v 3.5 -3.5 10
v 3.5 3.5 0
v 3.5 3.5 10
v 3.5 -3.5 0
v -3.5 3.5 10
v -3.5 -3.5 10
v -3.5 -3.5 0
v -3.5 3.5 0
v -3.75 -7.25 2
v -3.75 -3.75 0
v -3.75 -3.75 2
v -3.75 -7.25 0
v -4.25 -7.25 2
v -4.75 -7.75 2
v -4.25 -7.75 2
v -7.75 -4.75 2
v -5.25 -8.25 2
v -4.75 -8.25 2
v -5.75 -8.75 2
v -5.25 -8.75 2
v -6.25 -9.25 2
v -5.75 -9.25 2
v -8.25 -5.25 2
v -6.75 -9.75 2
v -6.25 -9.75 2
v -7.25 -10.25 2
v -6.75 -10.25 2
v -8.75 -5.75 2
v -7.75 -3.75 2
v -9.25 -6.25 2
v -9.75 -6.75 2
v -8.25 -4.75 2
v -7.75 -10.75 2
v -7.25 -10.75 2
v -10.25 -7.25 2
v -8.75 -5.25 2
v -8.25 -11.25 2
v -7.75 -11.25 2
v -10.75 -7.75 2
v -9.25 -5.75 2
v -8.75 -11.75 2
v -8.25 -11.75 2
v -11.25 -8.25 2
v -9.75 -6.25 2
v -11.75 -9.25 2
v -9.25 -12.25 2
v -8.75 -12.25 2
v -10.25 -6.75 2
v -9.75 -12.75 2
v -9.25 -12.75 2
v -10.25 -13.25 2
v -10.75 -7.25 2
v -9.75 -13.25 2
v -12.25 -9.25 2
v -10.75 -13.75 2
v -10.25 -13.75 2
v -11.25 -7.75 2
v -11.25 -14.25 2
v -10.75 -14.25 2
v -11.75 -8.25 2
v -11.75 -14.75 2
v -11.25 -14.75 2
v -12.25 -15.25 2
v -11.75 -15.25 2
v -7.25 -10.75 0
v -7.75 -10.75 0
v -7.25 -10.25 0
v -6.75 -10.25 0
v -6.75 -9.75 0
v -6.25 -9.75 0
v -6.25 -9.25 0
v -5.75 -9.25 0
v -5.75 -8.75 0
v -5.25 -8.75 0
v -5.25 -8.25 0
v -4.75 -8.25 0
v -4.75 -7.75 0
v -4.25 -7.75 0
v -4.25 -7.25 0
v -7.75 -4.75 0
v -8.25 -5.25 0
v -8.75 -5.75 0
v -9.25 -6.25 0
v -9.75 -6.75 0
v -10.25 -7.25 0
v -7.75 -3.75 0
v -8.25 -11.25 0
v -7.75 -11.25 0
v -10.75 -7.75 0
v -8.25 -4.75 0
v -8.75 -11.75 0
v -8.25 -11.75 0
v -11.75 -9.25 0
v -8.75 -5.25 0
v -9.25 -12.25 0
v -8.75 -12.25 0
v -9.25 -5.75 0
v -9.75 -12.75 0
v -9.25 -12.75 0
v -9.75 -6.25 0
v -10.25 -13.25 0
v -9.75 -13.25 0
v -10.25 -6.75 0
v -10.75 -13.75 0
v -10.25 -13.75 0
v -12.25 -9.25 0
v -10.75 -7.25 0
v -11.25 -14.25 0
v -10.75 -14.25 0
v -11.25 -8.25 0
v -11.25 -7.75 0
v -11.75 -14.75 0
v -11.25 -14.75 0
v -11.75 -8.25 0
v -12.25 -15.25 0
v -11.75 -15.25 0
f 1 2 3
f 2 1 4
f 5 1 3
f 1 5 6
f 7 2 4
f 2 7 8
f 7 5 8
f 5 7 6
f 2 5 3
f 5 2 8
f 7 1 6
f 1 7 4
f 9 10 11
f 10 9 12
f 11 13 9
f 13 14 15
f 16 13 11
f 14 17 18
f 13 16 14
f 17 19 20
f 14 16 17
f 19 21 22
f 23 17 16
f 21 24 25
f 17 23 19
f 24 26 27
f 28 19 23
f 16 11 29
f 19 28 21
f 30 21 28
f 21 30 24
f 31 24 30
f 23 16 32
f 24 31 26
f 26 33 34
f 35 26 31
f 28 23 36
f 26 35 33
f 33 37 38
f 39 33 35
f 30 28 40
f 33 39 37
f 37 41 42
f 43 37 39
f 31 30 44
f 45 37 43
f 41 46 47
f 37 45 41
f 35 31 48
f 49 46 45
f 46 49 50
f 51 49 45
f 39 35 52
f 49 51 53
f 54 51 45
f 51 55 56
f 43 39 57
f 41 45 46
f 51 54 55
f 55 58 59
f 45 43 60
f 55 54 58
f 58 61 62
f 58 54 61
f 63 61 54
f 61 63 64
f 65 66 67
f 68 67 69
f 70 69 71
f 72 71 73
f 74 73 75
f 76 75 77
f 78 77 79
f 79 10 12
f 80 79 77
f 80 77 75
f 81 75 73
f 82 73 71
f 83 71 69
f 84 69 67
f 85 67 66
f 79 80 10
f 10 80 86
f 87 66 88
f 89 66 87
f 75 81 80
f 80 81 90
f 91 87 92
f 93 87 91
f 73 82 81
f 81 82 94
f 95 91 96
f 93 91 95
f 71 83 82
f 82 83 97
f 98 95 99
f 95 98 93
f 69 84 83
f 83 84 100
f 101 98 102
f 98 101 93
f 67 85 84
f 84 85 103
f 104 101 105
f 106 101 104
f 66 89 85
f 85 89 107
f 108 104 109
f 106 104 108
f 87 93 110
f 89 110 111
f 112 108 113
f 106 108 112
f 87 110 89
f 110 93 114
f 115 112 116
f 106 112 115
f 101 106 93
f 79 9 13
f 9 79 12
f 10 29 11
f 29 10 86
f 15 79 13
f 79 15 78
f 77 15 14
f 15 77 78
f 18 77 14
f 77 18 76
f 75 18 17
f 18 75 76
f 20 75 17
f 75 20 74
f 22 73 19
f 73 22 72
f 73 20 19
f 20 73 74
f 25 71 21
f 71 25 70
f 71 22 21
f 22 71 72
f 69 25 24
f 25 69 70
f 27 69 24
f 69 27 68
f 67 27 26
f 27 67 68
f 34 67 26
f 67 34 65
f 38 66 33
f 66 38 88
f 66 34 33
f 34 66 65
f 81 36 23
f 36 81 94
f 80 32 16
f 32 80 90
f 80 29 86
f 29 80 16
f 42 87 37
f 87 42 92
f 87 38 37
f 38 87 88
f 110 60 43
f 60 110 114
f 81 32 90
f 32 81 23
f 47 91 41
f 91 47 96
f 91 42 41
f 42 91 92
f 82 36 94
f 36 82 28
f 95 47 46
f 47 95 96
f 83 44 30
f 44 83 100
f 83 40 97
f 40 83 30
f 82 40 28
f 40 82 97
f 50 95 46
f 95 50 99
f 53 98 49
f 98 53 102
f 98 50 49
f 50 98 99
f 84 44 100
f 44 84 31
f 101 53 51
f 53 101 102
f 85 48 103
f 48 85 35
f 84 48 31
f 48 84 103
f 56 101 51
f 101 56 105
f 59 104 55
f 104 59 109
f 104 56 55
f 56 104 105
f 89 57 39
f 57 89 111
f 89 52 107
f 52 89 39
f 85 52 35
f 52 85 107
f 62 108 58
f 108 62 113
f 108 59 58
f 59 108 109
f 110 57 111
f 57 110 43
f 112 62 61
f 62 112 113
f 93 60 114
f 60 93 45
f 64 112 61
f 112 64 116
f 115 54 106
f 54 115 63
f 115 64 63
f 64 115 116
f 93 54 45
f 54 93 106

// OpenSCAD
translate([0, 0, 5]) color([0,1,0,0.9]) cube([7, 7, 10], center=true);
translate([-4, -7, 1]) color([1,0,0]) cube([0.5, 0.5, 2], center=true);
translate([-4, -6.5, 1]) color([1,0,0]) cube([0.5, 0.5, 2], center=true);
translate([-4, -6, 1]) color([1,0,0]) cube([0.5, 0.5, 2], center=true);
translate([-4, -5.5, 1]) color([1,0,0]) cube([0.5, 0.5, 2], center=true);
translate([-4, -5, 1]) color([1,0,0]) cube([0.5, 0.5, 2], center=true);
translate([-4, -4.5, 1]) color([1,0,0]) cube([0.5, 0.5, 2], center=true);
translate([-4, -4, 1]) color([1,0,0]) cube([0.5, 0.5, 2], center=true);
translate([-4.5, -7.5, 1]) color([1,0,0]) cube([0.5, 0.5, 2], center=true);
translate([-4.5, -7, 1]) color([1,0,0]) cube([0.5, 0.5, 2], center=true);
translate([-4.5, -6.5, 1]) color([1,0,0]) cube([0.5, 0.5, 2], center=true);
translate([-4.5, -6, 1]) color([1,0,0]) cube([0.5, 0.5, 2], center=true);
translate([-4.5, -5.5, 1]) color([1,0,0]) cube([0.5, 0.5, 2], center=true);
translate([-4.5, -5, 1]) color([1,0,0]) cube([0.5, 0.5, 2], center=true);
translate([-4.5, -4.5, 1]) color([1,0,0]) cube([0.5, 0.5, 2], center=true);
translate([-4.5, -4, 1]) color([1,0,0]) cube([0.5, 0.5, 2], center=true);
translate([-5, -8, 1]) color([1,0,0]) cube([0.5, 0.5, 2], center=true);
translate([-5, -7.5, 1]) color([1,0,0]) cube([0.5, 0.5, 2], center=true);
translate([-5, -7, 1]) color([1,0,0]) cube([0.5, 0.5, 2], center=true);
translate([-5, -6.5, 1]) color([1,0,0]) cube([0.5, 0.5, 2], center=true);
translate([-5, -6, 1]) color([1,0,0]) cube([0.5, 0.5, 2], center=true);
translate([-5, -5.5, 1]) color([1,0,0]) cube([0.5, 0.5, 2], center=true);
translate([-5, -5, 1]) color([1,0,0]) cube([0.5, 0.5, 2], center=true);
translate([-5, -4.5, 1]) color([1,0,0]) cube([0.5, 0.5, 2], center=true);
translate([-5, -4, 1]) color([1,0,0]) cube([0.5, 0.5, 2], center=true);
translate([-5.5, -8.5, 1]) color([1,0,0]) cube([0.5, 0.5, 2], center=true);
translate([-5.5, -8, 1]) color([1,0,0]) cube([0.5, 0.5, 2], center=true);
translate([-5.5, -7.5, 1]) color([1,0,0]) cube([0.5, 0.5, 2], center=true);
translate([-5.5, -7, 1]) color([1,0,0]) cube([0.5, 0.5, 2], center=true);
translate([-5.5, -6.5, 1]) color([1,0,0]) cube([0.5, 0.5, 2], center=true);
translate([-5.5, -6, 1]) color([1,0,0]) cube([0.5, 0.5, 2], center=true);
translate([-5.5, -5.5, 1]) color([1,0,0]) cube([0.5, 0.5, 2], center=true);
translate([-5.5, -5, 1]) color([1,0,0]) cube([0.5, 0.5, 2], center=true);
translate([-5.5, -4.5, 1]) color([1,0,0]) cube([0.5, 0.5, 2], center=true);
translate([-5.5, -4, 1]) color([1,0,0]) cube([0.5, 0.5, 2], center=true);
translate([-6, -9, 1]) color([1,0,0]) cube([0.5, 0.5, 2], center=true);
translate([-6, -8.5, 1]) color([1,0,0]) cube([0.5, 0.5, 2], center=true);
translate([-6, -8, 1]) color([1,0,0]) cube([0.5, 0.5, 2], center=true);
translate([-6, -7.5, 1]) color([1,0,0]) cube([0.5, 0.5, 2], center=true);
translate([-6, -7, 1]) color([1,0,0]) cube([0.5, 0.5, 2], center=true);
translate([-6, -6.5, 1]) color([1,0,0]) cube([0.5, 0.5, 2], center=true);
translate([-6, -6, 1]) color([1,0,0]) cube([0.5, 0.5, 2], center=true);
translate([-6, -5.5, 1]) color([1,0,0]) cube([0.5, 0.5, 2], center=true);
translate([-6, -5, 1]) color([1,0,0]) cube([0.5, 0.5, 2], center=true);
translate([-6, -4.5, 1]) color([1,0,0]) cube([0.5, 0.5, 2], center=true);
translate([-6, -4, 1]) color([1,0,0]) cube([0.5, 0.5, 2], center=true);
translate([-6.5, -9.5, 1]) color([1,0,0]) cube([0.5, 0.5, 2], center=true);
translate([-6.5, -9, 1]) color([1,0,0]) cube([0.5, 0.5, 2], center=true);
translate([-6.5, -8.5, 1]) color([1,0,0]) cube([0.5, 0.5, 2], center=true);
translate([-6.5, -8, 1]) color([1,0,0]) cube([0.5, 0.5, 2], center=true);
translate([-6.5, -7.5, 1]) color([1,0,0]) cube([0.5, 0.5, 2], center=true);
translate([-6.5, -7, 1]) color([1,0,0]) cube([0.5, 0.5, 2], center=true);
translate([-6.5, -6.5, 1]) color([1,0,0]) cube([0.5, 0.5, 2], center=true);
translate([-6.5, -6, 1]) color([1,0,0]) cube([0.5, 0.5, 2], center=true);
translate([-6.5, -5.5, 1]) color([1,0,0]) cube([0.5, 0.5, 2], center=true);
translate([-6.5, -5, 1]) color([1,0,0]) cube([0.5, 0.5, 2], center=true);
translate([-6.5, -4.5, 1]) color([1,0,0]) cube([0.5, 0.5, 2], center=true);
translate([-6.5, -4, 1]) color([1,0,0]) cube([0.5, 0.5, 2], center=true);
translate([-7, -10, 1]) color([1,0,0]) cube([0.5, 0.5, 2], center=true);
translate([-7, -9.5, 1]) color([1,0,0]) cube([0.5, 0.5, 2], center=true);
translate([-7, -9, 1]) color([1,0,0]) cube([0.5, 0.5, 2], center=true);
translate([-7, -8.5, 1]) color([1,0,0]) cube([0.5, 0.5, 2], center=true);
translate([-7, -8, 1]) color([1,0,0]) cube([0.5, 0.5, 2], center=true);
translate([-7, -7.5, 1]) color([1,0,0]) cube([0.5, 0.5, 2], center=true);
translate([-7, -7, 1]) color([1,0,0]) cube([0.5, 0.5, 2], center=true);
translate([-7, -6.5, 1]) color([1,0,0]) cube([0.5, 0.5, 2], center=true);
translate([-7, -6, 1]) color([1,0,0]) cube([0.5, 0.5, 2], center=true);
translate([-7, -5.5, 1]) color([1,0,0]) cube([0.5, 0.5, 2], center=true);
translate([-7, -5, 1]) color([1,0,0]) cube([0.5, 0.5, 2], center=true);
translate([-7, -4.5, 1]) color([1,0,0]) cube([0.5, 0.5, 2], center=true);
translate([-7, -4, 1]) color([1,0,0]) cube([0.5, 0.5, 2], center=true);
translate([-7.5, -10.5, 1]) color([1,0,0]) cube([0.5, 0.5, 2], center=true);
translate([-7.5, -10, 1]) color([1,0,0]) cube([0.5, 0.5, 2], center=true);
translate([-7.5, -9.5, 1]) color([1,0,0]) cube([0.5, 0.5, 2], center=true);
translate([-7.5, -9, 1]) color([1,0,0]) cube([0.5, 0.5, 2], center=true);
translate([-7.5, -8.5, 1]) color([1,0,0]) cube([0.5, 0.5, 2], center=true);
translate([-7.5, -8, 1]) color([1,0,0]) cube([0.5, 0.5, 2], center=true);
translate([-7.5, -7.5, 1]) color([1,0,0]) cube([0.5, 0.5, 2], center=true);
translate([-7.5, -7, 1]) color([1,0,0]) cube([0.5, 0.5, 2], center=true);
translate([-7.5, -6.5, 1]) color([1,0,0]) cube([0.5, 0.5, 2], center=true);
translate([-7.5, -6, 1]) color([1,0,0]) cube([0.5, 0.5, 2], center=true);
translate([-7.5, -5.5, 1]) color([1,0,0]) cube([0.5, 0.5, 2], center=true);
translate([-7.5, -5, 1]) color([1,0,0]) cube([0.5, 0.5, 2], center=true);
translate([-7.5, -4.5, 1]) color([1,0,0]) cube([0.5, 0.5, 2], center=true);
translate([-7.5, -4, 1]) color([1,0,0]) cube([0.5, 0.5, 2], center=true);
translate([-8, -11, 1]) color([1,0,0]) cube([0.5, 0.5, 2], center=true);
translate([-8, -10.5, 1]) color([1,0,0]) cube([0.5, 0.5, 2], center=true);
translate([-8, -10, 1]) color([1,0,0]) cube([0.5, 0.5, 2], center=true);
translate([-8, -9.5, 1]) color([1,0,0]) cube([0.5, 0.5, 2], center=true);
translate([-8, -9, 1]) color([1,0,0]) cube([0.5, 0.5, 2], center=true);
translate([-8, -8.5, 1]) color([1,0,0]) cube([0.5, 0.5, 2], center=true);
translate([-8, -8, 1]) color([1,0,0]) cube([0.5, 0.5, 2], center=true);
translate([-8, -7.5, 1]) color([1,0,0]) cube([0.5, 0.5, 2], center=true);
translate([-8, -7, 1]) color([1,0,0]) cube([0.5, 0.5, 2], center=true);
translate([-8, -6.5, 1]) color([1,0,0]) cube([0.5, 0.5, 2], center=true);
translate([-8, -6, 1]) color([1,0,0]) cube([0.5, 0.5, 2], center=true);
translate([-8, -5.5, 1]) color([1,0,0]) cube([0.5, 0.5, 2], center=true);
translate([-8, -5, 1]) color([1,0,0]) cube([0.5, 0.5, 2], center=true);
translate([-8.5, -11.5, 1]) color([1,0,0]) cube([0.5, 0.5, 2], center=true);
translate([-8.5, -11, 1]) color([1,0,0]) cube([0.5, 0.5, 2], center=true);
translate([-8.5, -10.5, 1]) color([1,0,0]) cube([0.5, 0.5, 2], center=true);
translate([-8.5, -10, 1]) color([1,0,0]) cube([0.5, 0.5, 2], center=true);
translate([-8.5, -9.5, 1]) color([1,0,0]) cube([0.5, 0.5, 2], center=true);
translate([-8.5, -9, 1]) color([1,0,0]) cube([0.5, 0.5, 2], center=true);
translate([-8.5, -8.5, 1]) color([1,0,0]) cube([0.5, 0.5, 2], center=true);
translate([-8.5, -8, 1]) color([1,0,0]) cube([0.5, 0.5, 2], center=true);
translate([-8.5, -7.5, 1]) color([1,0,0]) cube([0.5, 0.5, 2], center=true);
translate([-8.5, -7, 1]) color([1,0,0]) cube([0.5, 0.5, 2], center=true);
translate([-8.5, -6.5, 1]) color([1,0,0]) cube([0.5, 0.5, 2], center=true);
translate([-8.5, -6, 1]) color([1,0,0]) cube([0.5, 0.5, 2], center=true);
translate([-8.5, -5.5, 1]) color([1,0,0]) cube([0.5, 0.5, 2], center=true);
translate([-9, -12, 1]) color([1,0,0]) cube([0.5, 0.5, 2], center=true);
translate([-9, -11.5, 1]) color([1,0,0]) cube([0.5, 0.5, 2], center=true);
translate([-9, -11, 1]) color([1,0,0]) cube([0.5, 0.5, 2], center=true);
translate([-9, -10.5, 1]) color([1,0,0]) cube([0.5, 0.5, 2], center=true);
translate([-9, -10, 1]) color([1,0,0]) cube([0.5, 0.5, 2], center=true);
translate([-9, -9.5, 1]) color([1,0,0]) cube([0.5, 0.5, 2], center=true);
translate([-9, -9, 1]) color([1,0,0]) cube([0.5, 0.5, 2], center=true);
translate([-9, -8.5, 1]) color([1,0,0]) cube([0.5, 0.5, 2], center=true);
translate([-9, -8, 1]) color([1,0,0]) cube([0.5, 0.5, 2], center=true);
translate([-9, -7.5, 1]) color([1,0,0]) cube([0.5, 0.5, 2], center=true);
translate([-9, -7, 1]) color([1,0,0]) cube([0.5, 0.5, 2], center=true);
translate([-9, -6.5, 1]) color([1,0,0]) cube([0.5, 0.5, 2], center=true);
translate([-9, -6, 1]) color([1,0,0]) cube([0.5, 0.5, 2], center=true);
translate([-9.5, -12.5, 1]) color([1,0,0]) cube([0.5, 0.5, 2], center=true);
translate([-9.5, -12, 1]) color([1,0,0]) cube([0.5, 0.5, 2], center=true);
translate([-9.5, -11.5, 1]) color([1,0,0]) cube([0.5, 0.5, 2], center=true);
translate([-9.5, -11, 1]) color([1,0,0]) cube([0.5, 0.5, 2], center=true);
translate([-9.5, -10.5, 1]) color([1,0,0]) cube([0.5, 0.5, 2], center=true);
translate([-9.5, -10, 1]) color([1,0,0]) cube([0.5, 0.5, 2], center=true);
translate([-9.5, -9.5, 1]) color([1,0,0]) cube([0.5, 0.5, 2], center=true);
translate([-9.5, -9, 1]) color([1,0,0]) cube([0.5, 0.5, 2], center=true);
translate([-9.5, -8.5, 1]) color([1,0,0]) cube([0.5, 0.5, 2], center=true);
translate([-9.5, -8, 1]) color([1,0,0]) cube([0.5, 0.5, 2], center=true);
translate([-9.5, -7.5, 1]) color([1,0,0]) cube([0.5, 0.5, 2], center=true);
translate([-9.5, -7, 1]) color([1,0,0]) cube([0.5, 0.5, 2], center=true);
translate([-9.5, -6.5, 1]) color([1,0,0]) cube([0.5, 0.5, 2], center=true);
translate([-10, -13, 1]) color([1,0,0]) cube([0.5, 0.5, 2], center=true);
translate([-10, -12.5, 1]) color([1,0,0]) cube([0.5, 0.5, 2], center=true);
translate([-10, -12, 1]) color([1,0,0]) cube([0.5, 0.5, 2], center=true);
translate([-10, -11.5, 1]) color([1,0,0]) cube([0.5, 0.5, 2], center=true);
translate([-10, -11, 1]) color([1,0,0]) cube([0.5, 0.5, 2], center=true);
translate([-10, -10.5, 1]) color([1,0,0]) cube([0.5, 0.5, 2], center=true);
translate([-10, -10, 1]) color([1,0,0]) cube([0.5, 0.5, 2], center=true);
translate([-10, -9.5, 1]) color([1,0,0]) cube([0.5, 0.5, 2], center=true);
translate([-10, -9, 1]) color([1,0,0]) cube([0.5, 0.5, 2], center=true);
translate([-10, -8.5, 1]) color([1,0,0]) cube([0.5, 0.5, 2], center=true);
translate([-10, -8, 1]) color([1,0,0]) cube([0.5, 0.5, 2], center=true);
translate([-10, -7.5, 1]) color([1,0,0]) cube([0.5, 0.5, 2], center=true);
translate([-10, -7, 1]) color([1,0,0]) cube([0.5, 0.5, 2], center=true);
translate([-10.5, -13.5, 1]) color([1,0,0]) cube([0.5, 0.5, 2], center=true);
translate([-10.5, -13, 1]) color([1,0,0]) cube([0.5, 0.5, 2], center=true);
translate([-10.5, -12.5, 1]) color([1,0,0]) cube([0.5, 0.5, 2], center=true);
translate([-10.5, -12, 1]) color([1,0,0]) cube([0.5, 0.5, 2], center=true);
translate([-10.5, -11.5, 1]) color([1,0,0]) cube([0.5, 0.5, 2], center=true);
translate([-10.5, -11, 1]) color([1,0,0]) cube([0.5, 0.5, 2], center=true);
translate([-10.5, -10.5, 1]) color([1,0,0]) cube([0.5, 0.5, 2], center=true);
translate([-10.5, -10, 1]) color([1,0,0]) cube([0.5, 0.5, 2], center=true);
translate([-10.5, -9.5, 1]) color([1,0,0]) cube([0.5, 0.5, 2], center=true);
translate([-10.5, -9, 1]) color([1,0,0]) cube([0.5, 0.5, 2], center=true);
translate([-10.5, -8.5, 1]) color([1,0,0]) cube([0.5, 0.5, 2], center=true);
translate([-10.5, -8, 1]) color([1,0,0]) cube([0.5, 0.5, 2], center=true);
translate([-10.5, -7.5, 1]) color([1,0,0]) cube([0.5, 0.5, 2], center=true);
translate([-11, -14, 1]) color([1,0,0]) cube([0.5, 0.5, 2], center=true);
translate([-11, -13.5, 1]) color([1,0,0]) cube([0.5, 0.5, 2], center=true);
translate([-11, -13, 1]) color([1,0,0]) cube([0.5, 0.5, 2], center=true);
translate([-11, -12.5, 1]) color([1,0,0]) cube([0.5, 0.5, 2], center=true);
translate([-11, -12, 1]) color([1,0,0]) cube([0.5, 0.5, 2], center=true);
translate([-11, -11.5, 1]) color([1,0,0]) cube([0.5, 0.5, 2], center=true);
translate([-11, -11, 1]) color([1,0,0]) cube([0.5, 0.5, 2], center=true);
translate([-11, -10.5, 1]) color([1,0,0]) cube([0.5, 0.5, 2], center=true);
translate([-11, -10, 1]) color([1,0,0]) cube([0.5, 0.5, 2], center=true);
translate([-11, -9.5, 1]) color([1,0,0]) cube([0.5, 0.5, 2], center=true);
translate([-11, -9, 1]) color([1,0,0]) cube([0.5, 0.5, 2], center=true);
translate([-11, -8.5, 1]) color([1,0,0]) cube([0.5, 0.5, 2], center=true);
translate([-11, -8, 1]) color([1,0,0]) cube([0.5, 0.5, 2], center=true);
translate([-11.5, -14.5, 1]) color([1,0,0]) cube([0.5, 0.5, 2], center=true);
translate([-11.5, -14, 1]) color([1,0,0]) cube([0.5, 0.5, 2], center=true);
translate([-11.5, -13.5, 1]) color([1,0,0]) cube([0.5, 0.5, 2], center=true);
translate([-11.5, -13, 1]) color([1,0,0]) cube([0.5, 0.5, 2], center=true);
translate([-11.5, -12.5, 1]) color([1,0,0]) cube([0.5, 0.5, 2], center=true);
translate([-11.5, -12, 1]) color([1,0,0]) cube([0.5, 0.5, 2], center=true);
translate([-11.5, -11.5, 1]) color([1,0,0]) cube([0.5, 0.5, 2], center=true);
translate([-11.5, -11, 1]) color([1,0,0]) cube([0.5, 0.5, 2], center=true);
translate([-11.5, -10.5, 1]) color([1,0,0]) cube([0.5, 0.5, 2], center=true);
translate([-11.5, -10, 1]) color([1,0,0]) cube([0.5, 0.5, 2], center=true);
translate([-11.5, -9.5, 1]) color([1,0,0]) cube([0.5, 0.5, 2], center=true);
translate([-11.5, -9, 1]) color([1,0,0]) cube([0.5, 0.5, 2], center=true);
translate([-11.5, -8.5, 1]) color([1,0,0]) cube([0.5, 0.5, 2], center=true);
translate([-12, -15, 1]) color([1,0,0]) cube([0.5, 0.5, 2], center=true);
translate([-12, -14.5, 1]) color([1,0,0]) cube([0.5, 0.5, 2], center=true);
translate([-12, -14, 1]) color([1,0,0]) cube([0.5, 0.5, 2], center=true);
translate([-12, -13.5, 1]) color([1,0,0]) cube([0.5, 0.5, 2], center=true);
translate([-12, -13, 1]) color([1,0,0]) cube([0.5, 0.5, 2], center=true);
translate([-12, -12.5, 1]) color([1,0,0]) cube([0.5, 0.5, 2], center=true);
translate([-12, -12, 1]) color([1,0,0]) cube([0.5, 0.5, 2], center=true);
translate([-12, -11.5, 1]) color([1,0,0]) cube([0.5, 0.5, 2], center=true);
translate([-12, -11, 1]) color([1,0,0]) cube([0.5, 0.5, 2], center=true);
translate([-12, -10.5, 1]) color([1,0,0]) cube([0.5, 0.5, 2], center=true);
translate([-12, -10, 1]) color([1,0,0]) cube([0.5, 0.5, 2], center=true);
translate([-12, -9.5, 1]) color([1,0,0]) cube([0.5, 0.5, 2], center=true);
